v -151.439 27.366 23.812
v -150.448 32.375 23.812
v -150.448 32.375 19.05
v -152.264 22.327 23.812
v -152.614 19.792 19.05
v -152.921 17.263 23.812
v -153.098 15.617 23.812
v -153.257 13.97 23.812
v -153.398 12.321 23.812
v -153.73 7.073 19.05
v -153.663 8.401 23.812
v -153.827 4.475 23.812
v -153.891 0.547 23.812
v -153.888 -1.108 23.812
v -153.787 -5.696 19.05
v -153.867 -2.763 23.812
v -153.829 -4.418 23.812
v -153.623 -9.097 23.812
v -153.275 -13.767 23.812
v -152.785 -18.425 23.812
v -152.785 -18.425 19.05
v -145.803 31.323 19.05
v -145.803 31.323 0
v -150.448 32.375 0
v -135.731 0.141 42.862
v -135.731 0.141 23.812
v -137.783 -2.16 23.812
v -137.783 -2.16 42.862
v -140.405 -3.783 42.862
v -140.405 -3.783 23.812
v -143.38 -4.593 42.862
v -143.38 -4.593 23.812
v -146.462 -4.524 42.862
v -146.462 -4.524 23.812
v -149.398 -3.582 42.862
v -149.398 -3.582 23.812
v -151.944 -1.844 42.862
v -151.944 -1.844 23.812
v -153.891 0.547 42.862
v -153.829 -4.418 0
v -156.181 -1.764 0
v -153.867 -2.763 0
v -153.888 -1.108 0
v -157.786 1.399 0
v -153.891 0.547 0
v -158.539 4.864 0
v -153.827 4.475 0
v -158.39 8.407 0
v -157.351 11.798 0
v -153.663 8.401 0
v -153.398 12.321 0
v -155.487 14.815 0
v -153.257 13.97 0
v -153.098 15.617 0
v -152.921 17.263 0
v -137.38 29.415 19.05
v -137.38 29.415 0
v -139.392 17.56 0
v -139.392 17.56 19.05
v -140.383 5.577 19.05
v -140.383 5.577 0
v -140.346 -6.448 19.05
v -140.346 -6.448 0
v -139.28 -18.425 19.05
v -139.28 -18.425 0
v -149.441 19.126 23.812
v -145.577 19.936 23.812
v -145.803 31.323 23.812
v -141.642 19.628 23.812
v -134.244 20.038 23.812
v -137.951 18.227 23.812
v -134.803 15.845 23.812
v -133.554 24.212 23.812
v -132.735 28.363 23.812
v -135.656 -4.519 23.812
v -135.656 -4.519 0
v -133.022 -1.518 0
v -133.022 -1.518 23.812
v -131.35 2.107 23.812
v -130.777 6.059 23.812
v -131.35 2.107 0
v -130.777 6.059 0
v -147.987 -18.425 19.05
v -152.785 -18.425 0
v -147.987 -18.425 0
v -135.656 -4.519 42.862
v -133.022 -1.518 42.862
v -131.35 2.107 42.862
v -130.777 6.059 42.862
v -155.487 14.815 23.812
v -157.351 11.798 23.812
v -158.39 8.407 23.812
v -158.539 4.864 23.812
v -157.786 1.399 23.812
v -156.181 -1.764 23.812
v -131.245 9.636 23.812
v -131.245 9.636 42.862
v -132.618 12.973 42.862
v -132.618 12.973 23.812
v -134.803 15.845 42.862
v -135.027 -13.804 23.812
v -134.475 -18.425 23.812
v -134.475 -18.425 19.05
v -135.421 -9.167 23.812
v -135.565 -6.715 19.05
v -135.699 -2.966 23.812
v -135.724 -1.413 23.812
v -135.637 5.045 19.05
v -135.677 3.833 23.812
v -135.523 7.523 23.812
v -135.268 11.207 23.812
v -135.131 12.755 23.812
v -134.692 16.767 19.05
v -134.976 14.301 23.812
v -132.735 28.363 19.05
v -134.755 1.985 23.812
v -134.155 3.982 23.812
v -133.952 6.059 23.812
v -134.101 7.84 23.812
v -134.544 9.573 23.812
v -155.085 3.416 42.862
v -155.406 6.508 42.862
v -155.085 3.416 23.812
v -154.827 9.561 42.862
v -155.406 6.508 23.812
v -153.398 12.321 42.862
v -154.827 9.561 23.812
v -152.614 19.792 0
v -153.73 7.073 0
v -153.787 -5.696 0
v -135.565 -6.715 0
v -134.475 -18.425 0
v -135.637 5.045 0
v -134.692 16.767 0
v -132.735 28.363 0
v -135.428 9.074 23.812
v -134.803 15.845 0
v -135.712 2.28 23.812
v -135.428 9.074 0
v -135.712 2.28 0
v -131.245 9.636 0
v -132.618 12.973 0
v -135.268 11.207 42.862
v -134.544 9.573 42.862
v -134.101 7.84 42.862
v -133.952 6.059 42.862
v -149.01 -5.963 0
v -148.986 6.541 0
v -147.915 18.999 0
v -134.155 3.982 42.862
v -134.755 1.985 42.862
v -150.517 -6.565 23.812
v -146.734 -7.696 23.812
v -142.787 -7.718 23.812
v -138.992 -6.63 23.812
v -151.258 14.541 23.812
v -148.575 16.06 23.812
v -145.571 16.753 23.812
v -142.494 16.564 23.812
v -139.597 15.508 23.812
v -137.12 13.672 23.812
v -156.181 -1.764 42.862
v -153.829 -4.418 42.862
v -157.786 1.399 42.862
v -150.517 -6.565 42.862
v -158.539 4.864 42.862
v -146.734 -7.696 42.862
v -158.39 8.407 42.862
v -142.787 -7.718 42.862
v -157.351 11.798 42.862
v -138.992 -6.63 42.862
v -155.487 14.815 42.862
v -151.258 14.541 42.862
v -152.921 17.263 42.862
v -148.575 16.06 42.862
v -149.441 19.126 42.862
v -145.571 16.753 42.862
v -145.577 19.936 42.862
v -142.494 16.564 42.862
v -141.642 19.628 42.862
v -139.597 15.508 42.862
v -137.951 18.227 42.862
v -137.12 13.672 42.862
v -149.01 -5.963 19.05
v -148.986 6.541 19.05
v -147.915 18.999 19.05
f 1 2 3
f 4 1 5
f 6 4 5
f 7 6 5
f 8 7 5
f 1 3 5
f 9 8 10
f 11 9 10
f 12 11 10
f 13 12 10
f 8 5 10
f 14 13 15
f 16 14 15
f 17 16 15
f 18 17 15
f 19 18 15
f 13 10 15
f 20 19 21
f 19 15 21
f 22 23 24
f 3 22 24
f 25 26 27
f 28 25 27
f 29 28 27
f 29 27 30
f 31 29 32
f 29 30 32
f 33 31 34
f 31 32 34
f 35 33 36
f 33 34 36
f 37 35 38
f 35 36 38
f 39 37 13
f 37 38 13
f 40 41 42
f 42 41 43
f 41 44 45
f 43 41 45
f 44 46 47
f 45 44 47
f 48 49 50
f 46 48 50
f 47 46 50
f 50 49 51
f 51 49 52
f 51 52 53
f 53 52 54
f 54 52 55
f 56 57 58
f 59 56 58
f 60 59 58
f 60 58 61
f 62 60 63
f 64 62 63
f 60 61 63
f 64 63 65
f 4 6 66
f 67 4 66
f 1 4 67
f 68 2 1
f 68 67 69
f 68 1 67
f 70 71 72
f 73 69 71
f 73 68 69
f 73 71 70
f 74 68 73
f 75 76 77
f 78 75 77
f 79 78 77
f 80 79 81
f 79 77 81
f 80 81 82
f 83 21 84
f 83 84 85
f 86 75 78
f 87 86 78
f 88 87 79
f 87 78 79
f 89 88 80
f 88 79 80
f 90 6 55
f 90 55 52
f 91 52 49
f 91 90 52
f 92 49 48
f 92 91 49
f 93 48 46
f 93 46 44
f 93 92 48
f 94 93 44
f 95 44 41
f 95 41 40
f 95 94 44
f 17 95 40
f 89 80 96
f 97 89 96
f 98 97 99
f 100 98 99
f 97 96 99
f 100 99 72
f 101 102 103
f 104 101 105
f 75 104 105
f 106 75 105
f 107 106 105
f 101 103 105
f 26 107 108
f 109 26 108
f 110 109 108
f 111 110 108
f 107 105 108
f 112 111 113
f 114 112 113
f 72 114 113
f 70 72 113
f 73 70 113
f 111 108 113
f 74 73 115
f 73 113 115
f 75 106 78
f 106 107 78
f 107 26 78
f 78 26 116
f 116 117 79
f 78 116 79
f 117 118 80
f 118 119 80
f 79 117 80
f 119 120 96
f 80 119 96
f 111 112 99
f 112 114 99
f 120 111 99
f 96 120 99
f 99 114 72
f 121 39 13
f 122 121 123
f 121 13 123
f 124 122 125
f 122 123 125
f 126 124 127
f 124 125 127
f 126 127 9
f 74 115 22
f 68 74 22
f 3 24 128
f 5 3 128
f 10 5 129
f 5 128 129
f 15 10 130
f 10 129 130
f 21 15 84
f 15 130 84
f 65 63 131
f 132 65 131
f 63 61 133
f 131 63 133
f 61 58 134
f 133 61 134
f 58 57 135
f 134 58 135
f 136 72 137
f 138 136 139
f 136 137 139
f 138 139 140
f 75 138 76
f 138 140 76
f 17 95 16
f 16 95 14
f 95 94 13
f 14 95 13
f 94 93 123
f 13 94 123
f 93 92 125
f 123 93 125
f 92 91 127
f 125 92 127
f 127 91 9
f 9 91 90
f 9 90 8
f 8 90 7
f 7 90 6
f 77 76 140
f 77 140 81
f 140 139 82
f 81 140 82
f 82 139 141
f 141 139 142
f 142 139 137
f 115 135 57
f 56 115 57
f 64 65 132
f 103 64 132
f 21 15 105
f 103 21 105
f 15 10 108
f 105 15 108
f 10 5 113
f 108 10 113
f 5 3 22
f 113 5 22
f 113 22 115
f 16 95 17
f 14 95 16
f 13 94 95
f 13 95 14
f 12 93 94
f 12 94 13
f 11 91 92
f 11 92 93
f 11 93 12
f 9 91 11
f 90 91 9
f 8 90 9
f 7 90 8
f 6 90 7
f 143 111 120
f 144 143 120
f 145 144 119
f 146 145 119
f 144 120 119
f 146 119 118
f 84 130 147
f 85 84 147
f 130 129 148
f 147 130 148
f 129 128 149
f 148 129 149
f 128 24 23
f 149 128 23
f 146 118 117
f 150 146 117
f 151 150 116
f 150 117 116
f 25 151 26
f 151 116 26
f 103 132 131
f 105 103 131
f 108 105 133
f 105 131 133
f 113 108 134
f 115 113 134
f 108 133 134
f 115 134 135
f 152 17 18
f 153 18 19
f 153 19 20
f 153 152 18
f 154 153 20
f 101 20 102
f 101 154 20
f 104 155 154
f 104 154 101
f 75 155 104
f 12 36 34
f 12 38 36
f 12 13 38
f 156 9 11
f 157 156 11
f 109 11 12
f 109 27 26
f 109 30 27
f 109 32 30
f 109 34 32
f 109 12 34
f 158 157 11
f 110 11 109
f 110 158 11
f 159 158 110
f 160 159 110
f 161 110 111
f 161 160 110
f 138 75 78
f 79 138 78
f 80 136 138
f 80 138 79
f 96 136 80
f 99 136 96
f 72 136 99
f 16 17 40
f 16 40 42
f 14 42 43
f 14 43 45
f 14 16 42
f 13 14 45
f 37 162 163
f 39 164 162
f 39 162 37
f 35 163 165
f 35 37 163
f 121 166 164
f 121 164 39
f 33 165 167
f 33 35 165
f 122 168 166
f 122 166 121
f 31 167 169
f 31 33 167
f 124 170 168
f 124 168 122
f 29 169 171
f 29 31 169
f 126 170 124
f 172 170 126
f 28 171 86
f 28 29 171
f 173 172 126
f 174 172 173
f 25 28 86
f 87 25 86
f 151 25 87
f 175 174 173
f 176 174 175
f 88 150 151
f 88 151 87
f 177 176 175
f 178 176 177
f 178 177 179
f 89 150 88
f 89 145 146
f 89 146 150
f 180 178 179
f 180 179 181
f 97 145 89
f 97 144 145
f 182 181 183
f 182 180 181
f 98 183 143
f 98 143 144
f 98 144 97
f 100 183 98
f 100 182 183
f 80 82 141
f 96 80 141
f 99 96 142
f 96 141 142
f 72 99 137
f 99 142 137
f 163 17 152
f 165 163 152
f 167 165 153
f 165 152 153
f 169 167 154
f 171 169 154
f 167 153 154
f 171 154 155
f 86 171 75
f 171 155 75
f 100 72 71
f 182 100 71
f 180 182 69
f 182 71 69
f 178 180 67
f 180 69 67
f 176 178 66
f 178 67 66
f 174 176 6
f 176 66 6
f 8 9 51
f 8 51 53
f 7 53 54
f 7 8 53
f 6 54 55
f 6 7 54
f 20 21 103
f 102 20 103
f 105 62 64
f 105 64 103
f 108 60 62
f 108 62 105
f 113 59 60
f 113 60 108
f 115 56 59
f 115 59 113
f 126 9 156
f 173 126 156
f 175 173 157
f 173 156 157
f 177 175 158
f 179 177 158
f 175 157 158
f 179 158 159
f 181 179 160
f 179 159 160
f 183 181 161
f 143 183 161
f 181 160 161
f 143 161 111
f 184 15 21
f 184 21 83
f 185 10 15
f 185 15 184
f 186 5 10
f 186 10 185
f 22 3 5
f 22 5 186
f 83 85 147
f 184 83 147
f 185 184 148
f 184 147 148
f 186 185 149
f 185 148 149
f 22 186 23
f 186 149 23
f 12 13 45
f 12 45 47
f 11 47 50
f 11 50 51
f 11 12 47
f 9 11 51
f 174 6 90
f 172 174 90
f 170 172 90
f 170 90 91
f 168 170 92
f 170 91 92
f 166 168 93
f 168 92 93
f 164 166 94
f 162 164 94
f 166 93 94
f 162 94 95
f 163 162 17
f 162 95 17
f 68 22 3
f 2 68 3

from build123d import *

# Parameters (mm, degrees)
F1_DEPTH = 19.05
F3_DEPTH = 4.7625
F5_DEPTH = 19.05
F6_DEPTH = 23.8125
F8_DEPTH = 23.8125


with BuildPart() as f1:
    # F0 (on Top) → F1 (new body)
    with BuildSketch(Plane.XY):
        with BuildLine():
            Line((-132.7347599463, 28.3629287724), (-137.3799231344, 29.4151408064))
            ThreePointArc((-137.3799231344, 29.4151408064), (-140.3830231556, 5.5767910807), (-139.2803849972, -18.4246613019))
            Line((-139.2803849972, -18.4246613019), (-134.4749199013, -18.4246613019))
            ThreePointArc((-134.4749199013, -18.4246613019), (-135.6374686335, 5.0447328221), (-132.7347599463, 28.3629287724))
        make_face()
    extrude(amount=F1_DEPTH)


with BuildPart() as f1b:
    # F0 (on Top) → F1, piece 2 (new body)
    with BuildSketch(Plane.XY):
        with BuildLine():
            ThreePointArc((-147.9872095519, -18.4246613019), (-148.9862311206, 6.5410451413), (-145.8030975801, 31.3231395476))
            Line((-145.8030975801, 31.3231395476), (-150.4482038917, 32.3753386981))
            ThreePointArc((-150.4482038917, 32.3753386981), (-153.7296449055, 7.0725446114), (-152.7853280455, -18.4246613019))
            Line((-152.7853280455, -18.4246613019), (-147.9872095519, -18.4246613019))
        make_face()
    extrude(amount=F1_DEPTH)


with BuildPart() as f3:
    # F2 (on face) → F3 (new body)
    with BuildSketch(Plane.XY.offset(19.05)):
        with BuildLine():
            Line((-145.8030975801, 31.3231395476), (-150.4482038917, 32.3753386981))
            ThreePointArc((-150.4482038917, 32.3753386981), (-153.7296449055, 7.0725446114), (-152.7853280455, -18.4246613019))
            Line((-152.7853280455, -18.4246613019), (-147.9872095519, -18.4246613019))
            ThreePointArc((-147.9872095519, -18.4246613019), (-148.9862311206, 6.5410451413), (-145.8030975801, 31.3231395476))
        make_face()
        with BuildLine():
            Line((-132.7347599463, 28.3629287724), (-145.8030975801, 31.3231395476))
            ThreePointArc((-145.8030975801, 31.3231395476), (-148.9862311206, 6.5410451413), (-147.9872095519, -18.4246613019))
            Line((-147.9872095519, -18.4246613019), (-134.4749199013, -18.4246613019))
            ThreePointArc((-134.4749199013, -18.4246613019), (-135.6374686335, 5.0447328221), (-132.7347599463, 28.3629287724))
        make_face()
    extrude(amount=F3_DEPTH)

    # F4 (on face) → F5 (join)
    with BuildSketch(Plane.XY.offset(23.8125)):
        with BuildLine():
            ThreePointArc((-153.891279398, 0.5465668514), (-155.4056601533, 6.507627891), (-153.3982149253, 12.3212121078))
            ThreePointArc((-153.3982149253, 12.3212121078), (-153.1795100202, 14.7939960805), (-152.9209463743, 17.2629305171))
            ThreePointArc((-152.9209463743, 17.2629305171), (-158.5778800893, 6.6404649248), (-153.8288271866, -4.4177524199))
            ThreePointArc((-153.8288271866, -4.4177524199), (-153.8800738093, -1.9358446467), (-153.891279398, 0.5465668514))
        make_face()
        with BuildLine():
            ThreePointArc((-153.3982149253, 12.3212121078), (-144.0254314137, 16.7699394438), (-135.2677715789, 11.2072386715))
            ThreePointArc((-135.2677715789, 11.2072386715), (-135.0554120904, 13.5280409391), (-134.8032373317, 15.8448550467))
            ThreePointArc((-134.8032373317, 15.8448550467), (-143.5984120239, 19.9227363481), (-152.9209463743, 17.2629305171))
            ThreePointArc((-152.9209463743, 17.2629305171), (-153.1795100202, 14.7939960805), (-153.3982149253, 12.3212121078))
        make_face()
        with BuildLine():
            ThreePointArc((-135.2677715789, 11.2072386715), (-134.2861871257, 8.7156665183), (-133.9520567695, 6.0586387167))
            ThreePointArc((-133.9520567695, 6.0586387167), (-134.406457061, 2.9689277543), (-135.7311768984, 0.140869974))
            ThreePointArc((-135.7311768984, 0.140869974), (-135.7135882934, -2.1895613935), (-135.6559903833, -4.5193472632))
            ThreePointArc((-135.6559903833, -4.5193472632), (-132.0555602103, 0.2341692001), (-130.7770567695, 6.0586387167))
            ThreePointArc((-130.7770567695, 6.0586387167), (-131.8229307251, 11.3496726416), (-134.8032373317, 15.8448550467))
            ThreePointArc((-134.8032373317, 15.8448550467), (-135.0554120904, 13.5280409391), (-135.2677715789, 11.2072386715))
        make_face()
        with BuildLine():
            ThreePointArc((-135.6559903833, -4.5193472632), (-135.7135882934, -2.1895613935), (-135.7311768984, 0.140869974))
            ThreePointArc((-135.7311768984, 0.140869974), (-144.9232387881, -4.6701843678), (-153.891279398, 0.5465668514))
            ThreePointArc((-153.891279398, 0.5465668514), (-153.8800738093, -1.9358446467), (-153.8288271866, -4.4177524199))
            ThreePointArc((-153.8288271866, -4.4177524199), (-144.7612995362, -7.8476439754), (-135.6559903833, -4.5193472632))
        make_face()
    extrude(amount=F5_DEPTH)


with BuildPart() as f6:
    # F4 (on face) → F6 (new body, through all)
    with BuildSketch(Plane.XY.offset(23.8125)):
        with BuildLine():
            ThreePointArc((-153.891279398, 0.5465668514), (-153.7575002986, 6.4386110288), (-153.3982149253, 12.3212121078))
            ThreePointArc((-153.3982149253, 12.3212121078), (-155.4056601533, 6.507627891), (-153.891279398, 0.5465668514))
        make_face()
        with BuildLine():
            ThreePointArc((-153.891279398, 0.5465668514), (-155.4056601533, 6.507627891), (-153.3982149253, 12.3212121078))
            ThreePointArc((-153.3982149253, 12.3212121078), (-153.1795100202, 14.7939960805), (-152.9209463743, 17.2629305171))
            ThreePointArc((-152.9209463743, 17.2629305171), (-158.5778800893, 6.6404649248), (-153.8288271866, -4.4177524199))
            ThreePointArc((-153.8288271866, -4.4177524199), (-153.8800738093, -1.9358446467), (-153.891279398, 0.5465668514))
        make_face()
    extrude(amount=-F6_DEPTH)


with BuildPart() as f8:
    # F7 (on face) → F8 (new body, through all)
    with BuildSketch(Plane.XY):
        with BuildLine():
            ThreePointArc((-130.7770567695, 6.0586387167), (-131.8229307251, 11.3496726416), (-134.8032373317, 15.8448550467))
            ThreePointArc((-134.8032373317, 15.8448550467), (-135.6124022646, 5.6787831954), (-135.6559903833, -4.5193472632))
            ThreePointArc((-135.6559903833, -4.5193472632), (-132.0555602103, 0.2341692001), (-130.7770567695, 6.0586387167))
        make_face()
    extrude(amount=F8_DEPTH)


solid = Compound([f1.part, f1b.part, f3.part, f6.part, f8.part])
